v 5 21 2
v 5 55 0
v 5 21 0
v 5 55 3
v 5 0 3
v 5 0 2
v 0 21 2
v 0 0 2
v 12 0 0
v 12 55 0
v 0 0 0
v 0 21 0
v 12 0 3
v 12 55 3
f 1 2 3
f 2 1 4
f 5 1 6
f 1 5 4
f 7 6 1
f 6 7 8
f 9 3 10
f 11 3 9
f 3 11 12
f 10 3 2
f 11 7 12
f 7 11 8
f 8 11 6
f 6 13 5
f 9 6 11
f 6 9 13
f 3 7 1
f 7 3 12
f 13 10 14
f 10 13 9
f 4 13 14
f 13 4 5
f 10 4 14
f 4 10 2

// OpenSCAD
translate([2.5, 1.5, 1.0]) color([0.5738660367891669, 0.9100160146990397, 0.534197968260724]) cube([5, 3, 2], center=true);
translate([2.5, 4.5, 1.0]) color([0.6805891325622565, 0.026696794662205203, 0.6349999099114583]) cube([5, 3, 2], center=true);
translate([2.5, 7.5, 1.0]) color([0.6063384177542189, 0.5759529480315407, 0.3912094093228269]) cube([5, 3, 2], center=true);
translate([2.5, 10.5, 1.0]) color([0.3701399403351875, 0.9805166506472687, 0.036392037611485795]) cube([5, 3, 2], center=true);
translate([2.5, 13.5, 1.0]) color([0.021636509855024078, 0.9610312802396112, 0.18497194139743833]) cube([5, 3, 2], center=true);
translate([2.5, 16.5, 1.0]) color([0.12389516442443171, 0.21057650988664645, 0.8007465903541809]) cube([5, 3, 2], center=true);
translate([2.5, 19.5, 1.0]) color([0.9369691586445807, 0.022782575668658378, 0.42561883196681716]) cube([5, 3, 2], center=true);
translate([8.5, 2.5, 1.5]) color([0.10150021937416975, 0.259919889792832, 0.22082927131631735]) cube([7, 5, 3], center=true);
translate([8.5, 7.5, 1.5]) color([0.6469257198353225, 0.3502939673965323, 0.18031790152968785]) cube([7, 5, 3], center=true);
translate([8.5, 12.5, 1.5]) color([0.5036365052098872, 0.03937870708469238, 0.10092124118896661]) cube([7, 5, 3], center=true);
translate([8.5, 17.5, 1.5]) color([0.9882351487225011, 0.19935579046706298, 0.35855530131160185]) cube([7, 5, 3], center=true);
translate([8.5, 22.5, 1.5]) color([0.7315983062253606, 0.8383265651934163, 0.9184820619953314]) cube([7, 5, 3], center=true);
translate([8.5, 27.5, 1.5]) color([0.16942460609746768, 0.6726405635730526, 0.9665489030431832]) cube([7, 5, 3], center=true);
translate([8.5, 32.5, 1.5]) color([0.05805094382649867, 0.6762017842993783, 0.8454245937016164]) cube([7, 5, 3], center=true);
translate([8.5, 37.5, 1.5]) color([0.342312541078584, 0.25068733928511167, 0.596791393469411]) cube([7, 5, 3], center=true);
translate([8.5, 42.5, 1.5]) color([0.44231403369907896, 0.17481948445144113, 0.47162541509628797]) cube([7, 5, 3], center=true);
translate([8.5, 47.5, 1.5]) color([0.40990539565755457, 0.5691127395242802, 0.5086001300626332]) cube([7, 5, 3], center=true);
translate([8.5, 52.5, 1.5]) color([0.3114460010002068, 0.35715168259026286, 0.837661174368979]) cube([7, 5, 3], center=true);
